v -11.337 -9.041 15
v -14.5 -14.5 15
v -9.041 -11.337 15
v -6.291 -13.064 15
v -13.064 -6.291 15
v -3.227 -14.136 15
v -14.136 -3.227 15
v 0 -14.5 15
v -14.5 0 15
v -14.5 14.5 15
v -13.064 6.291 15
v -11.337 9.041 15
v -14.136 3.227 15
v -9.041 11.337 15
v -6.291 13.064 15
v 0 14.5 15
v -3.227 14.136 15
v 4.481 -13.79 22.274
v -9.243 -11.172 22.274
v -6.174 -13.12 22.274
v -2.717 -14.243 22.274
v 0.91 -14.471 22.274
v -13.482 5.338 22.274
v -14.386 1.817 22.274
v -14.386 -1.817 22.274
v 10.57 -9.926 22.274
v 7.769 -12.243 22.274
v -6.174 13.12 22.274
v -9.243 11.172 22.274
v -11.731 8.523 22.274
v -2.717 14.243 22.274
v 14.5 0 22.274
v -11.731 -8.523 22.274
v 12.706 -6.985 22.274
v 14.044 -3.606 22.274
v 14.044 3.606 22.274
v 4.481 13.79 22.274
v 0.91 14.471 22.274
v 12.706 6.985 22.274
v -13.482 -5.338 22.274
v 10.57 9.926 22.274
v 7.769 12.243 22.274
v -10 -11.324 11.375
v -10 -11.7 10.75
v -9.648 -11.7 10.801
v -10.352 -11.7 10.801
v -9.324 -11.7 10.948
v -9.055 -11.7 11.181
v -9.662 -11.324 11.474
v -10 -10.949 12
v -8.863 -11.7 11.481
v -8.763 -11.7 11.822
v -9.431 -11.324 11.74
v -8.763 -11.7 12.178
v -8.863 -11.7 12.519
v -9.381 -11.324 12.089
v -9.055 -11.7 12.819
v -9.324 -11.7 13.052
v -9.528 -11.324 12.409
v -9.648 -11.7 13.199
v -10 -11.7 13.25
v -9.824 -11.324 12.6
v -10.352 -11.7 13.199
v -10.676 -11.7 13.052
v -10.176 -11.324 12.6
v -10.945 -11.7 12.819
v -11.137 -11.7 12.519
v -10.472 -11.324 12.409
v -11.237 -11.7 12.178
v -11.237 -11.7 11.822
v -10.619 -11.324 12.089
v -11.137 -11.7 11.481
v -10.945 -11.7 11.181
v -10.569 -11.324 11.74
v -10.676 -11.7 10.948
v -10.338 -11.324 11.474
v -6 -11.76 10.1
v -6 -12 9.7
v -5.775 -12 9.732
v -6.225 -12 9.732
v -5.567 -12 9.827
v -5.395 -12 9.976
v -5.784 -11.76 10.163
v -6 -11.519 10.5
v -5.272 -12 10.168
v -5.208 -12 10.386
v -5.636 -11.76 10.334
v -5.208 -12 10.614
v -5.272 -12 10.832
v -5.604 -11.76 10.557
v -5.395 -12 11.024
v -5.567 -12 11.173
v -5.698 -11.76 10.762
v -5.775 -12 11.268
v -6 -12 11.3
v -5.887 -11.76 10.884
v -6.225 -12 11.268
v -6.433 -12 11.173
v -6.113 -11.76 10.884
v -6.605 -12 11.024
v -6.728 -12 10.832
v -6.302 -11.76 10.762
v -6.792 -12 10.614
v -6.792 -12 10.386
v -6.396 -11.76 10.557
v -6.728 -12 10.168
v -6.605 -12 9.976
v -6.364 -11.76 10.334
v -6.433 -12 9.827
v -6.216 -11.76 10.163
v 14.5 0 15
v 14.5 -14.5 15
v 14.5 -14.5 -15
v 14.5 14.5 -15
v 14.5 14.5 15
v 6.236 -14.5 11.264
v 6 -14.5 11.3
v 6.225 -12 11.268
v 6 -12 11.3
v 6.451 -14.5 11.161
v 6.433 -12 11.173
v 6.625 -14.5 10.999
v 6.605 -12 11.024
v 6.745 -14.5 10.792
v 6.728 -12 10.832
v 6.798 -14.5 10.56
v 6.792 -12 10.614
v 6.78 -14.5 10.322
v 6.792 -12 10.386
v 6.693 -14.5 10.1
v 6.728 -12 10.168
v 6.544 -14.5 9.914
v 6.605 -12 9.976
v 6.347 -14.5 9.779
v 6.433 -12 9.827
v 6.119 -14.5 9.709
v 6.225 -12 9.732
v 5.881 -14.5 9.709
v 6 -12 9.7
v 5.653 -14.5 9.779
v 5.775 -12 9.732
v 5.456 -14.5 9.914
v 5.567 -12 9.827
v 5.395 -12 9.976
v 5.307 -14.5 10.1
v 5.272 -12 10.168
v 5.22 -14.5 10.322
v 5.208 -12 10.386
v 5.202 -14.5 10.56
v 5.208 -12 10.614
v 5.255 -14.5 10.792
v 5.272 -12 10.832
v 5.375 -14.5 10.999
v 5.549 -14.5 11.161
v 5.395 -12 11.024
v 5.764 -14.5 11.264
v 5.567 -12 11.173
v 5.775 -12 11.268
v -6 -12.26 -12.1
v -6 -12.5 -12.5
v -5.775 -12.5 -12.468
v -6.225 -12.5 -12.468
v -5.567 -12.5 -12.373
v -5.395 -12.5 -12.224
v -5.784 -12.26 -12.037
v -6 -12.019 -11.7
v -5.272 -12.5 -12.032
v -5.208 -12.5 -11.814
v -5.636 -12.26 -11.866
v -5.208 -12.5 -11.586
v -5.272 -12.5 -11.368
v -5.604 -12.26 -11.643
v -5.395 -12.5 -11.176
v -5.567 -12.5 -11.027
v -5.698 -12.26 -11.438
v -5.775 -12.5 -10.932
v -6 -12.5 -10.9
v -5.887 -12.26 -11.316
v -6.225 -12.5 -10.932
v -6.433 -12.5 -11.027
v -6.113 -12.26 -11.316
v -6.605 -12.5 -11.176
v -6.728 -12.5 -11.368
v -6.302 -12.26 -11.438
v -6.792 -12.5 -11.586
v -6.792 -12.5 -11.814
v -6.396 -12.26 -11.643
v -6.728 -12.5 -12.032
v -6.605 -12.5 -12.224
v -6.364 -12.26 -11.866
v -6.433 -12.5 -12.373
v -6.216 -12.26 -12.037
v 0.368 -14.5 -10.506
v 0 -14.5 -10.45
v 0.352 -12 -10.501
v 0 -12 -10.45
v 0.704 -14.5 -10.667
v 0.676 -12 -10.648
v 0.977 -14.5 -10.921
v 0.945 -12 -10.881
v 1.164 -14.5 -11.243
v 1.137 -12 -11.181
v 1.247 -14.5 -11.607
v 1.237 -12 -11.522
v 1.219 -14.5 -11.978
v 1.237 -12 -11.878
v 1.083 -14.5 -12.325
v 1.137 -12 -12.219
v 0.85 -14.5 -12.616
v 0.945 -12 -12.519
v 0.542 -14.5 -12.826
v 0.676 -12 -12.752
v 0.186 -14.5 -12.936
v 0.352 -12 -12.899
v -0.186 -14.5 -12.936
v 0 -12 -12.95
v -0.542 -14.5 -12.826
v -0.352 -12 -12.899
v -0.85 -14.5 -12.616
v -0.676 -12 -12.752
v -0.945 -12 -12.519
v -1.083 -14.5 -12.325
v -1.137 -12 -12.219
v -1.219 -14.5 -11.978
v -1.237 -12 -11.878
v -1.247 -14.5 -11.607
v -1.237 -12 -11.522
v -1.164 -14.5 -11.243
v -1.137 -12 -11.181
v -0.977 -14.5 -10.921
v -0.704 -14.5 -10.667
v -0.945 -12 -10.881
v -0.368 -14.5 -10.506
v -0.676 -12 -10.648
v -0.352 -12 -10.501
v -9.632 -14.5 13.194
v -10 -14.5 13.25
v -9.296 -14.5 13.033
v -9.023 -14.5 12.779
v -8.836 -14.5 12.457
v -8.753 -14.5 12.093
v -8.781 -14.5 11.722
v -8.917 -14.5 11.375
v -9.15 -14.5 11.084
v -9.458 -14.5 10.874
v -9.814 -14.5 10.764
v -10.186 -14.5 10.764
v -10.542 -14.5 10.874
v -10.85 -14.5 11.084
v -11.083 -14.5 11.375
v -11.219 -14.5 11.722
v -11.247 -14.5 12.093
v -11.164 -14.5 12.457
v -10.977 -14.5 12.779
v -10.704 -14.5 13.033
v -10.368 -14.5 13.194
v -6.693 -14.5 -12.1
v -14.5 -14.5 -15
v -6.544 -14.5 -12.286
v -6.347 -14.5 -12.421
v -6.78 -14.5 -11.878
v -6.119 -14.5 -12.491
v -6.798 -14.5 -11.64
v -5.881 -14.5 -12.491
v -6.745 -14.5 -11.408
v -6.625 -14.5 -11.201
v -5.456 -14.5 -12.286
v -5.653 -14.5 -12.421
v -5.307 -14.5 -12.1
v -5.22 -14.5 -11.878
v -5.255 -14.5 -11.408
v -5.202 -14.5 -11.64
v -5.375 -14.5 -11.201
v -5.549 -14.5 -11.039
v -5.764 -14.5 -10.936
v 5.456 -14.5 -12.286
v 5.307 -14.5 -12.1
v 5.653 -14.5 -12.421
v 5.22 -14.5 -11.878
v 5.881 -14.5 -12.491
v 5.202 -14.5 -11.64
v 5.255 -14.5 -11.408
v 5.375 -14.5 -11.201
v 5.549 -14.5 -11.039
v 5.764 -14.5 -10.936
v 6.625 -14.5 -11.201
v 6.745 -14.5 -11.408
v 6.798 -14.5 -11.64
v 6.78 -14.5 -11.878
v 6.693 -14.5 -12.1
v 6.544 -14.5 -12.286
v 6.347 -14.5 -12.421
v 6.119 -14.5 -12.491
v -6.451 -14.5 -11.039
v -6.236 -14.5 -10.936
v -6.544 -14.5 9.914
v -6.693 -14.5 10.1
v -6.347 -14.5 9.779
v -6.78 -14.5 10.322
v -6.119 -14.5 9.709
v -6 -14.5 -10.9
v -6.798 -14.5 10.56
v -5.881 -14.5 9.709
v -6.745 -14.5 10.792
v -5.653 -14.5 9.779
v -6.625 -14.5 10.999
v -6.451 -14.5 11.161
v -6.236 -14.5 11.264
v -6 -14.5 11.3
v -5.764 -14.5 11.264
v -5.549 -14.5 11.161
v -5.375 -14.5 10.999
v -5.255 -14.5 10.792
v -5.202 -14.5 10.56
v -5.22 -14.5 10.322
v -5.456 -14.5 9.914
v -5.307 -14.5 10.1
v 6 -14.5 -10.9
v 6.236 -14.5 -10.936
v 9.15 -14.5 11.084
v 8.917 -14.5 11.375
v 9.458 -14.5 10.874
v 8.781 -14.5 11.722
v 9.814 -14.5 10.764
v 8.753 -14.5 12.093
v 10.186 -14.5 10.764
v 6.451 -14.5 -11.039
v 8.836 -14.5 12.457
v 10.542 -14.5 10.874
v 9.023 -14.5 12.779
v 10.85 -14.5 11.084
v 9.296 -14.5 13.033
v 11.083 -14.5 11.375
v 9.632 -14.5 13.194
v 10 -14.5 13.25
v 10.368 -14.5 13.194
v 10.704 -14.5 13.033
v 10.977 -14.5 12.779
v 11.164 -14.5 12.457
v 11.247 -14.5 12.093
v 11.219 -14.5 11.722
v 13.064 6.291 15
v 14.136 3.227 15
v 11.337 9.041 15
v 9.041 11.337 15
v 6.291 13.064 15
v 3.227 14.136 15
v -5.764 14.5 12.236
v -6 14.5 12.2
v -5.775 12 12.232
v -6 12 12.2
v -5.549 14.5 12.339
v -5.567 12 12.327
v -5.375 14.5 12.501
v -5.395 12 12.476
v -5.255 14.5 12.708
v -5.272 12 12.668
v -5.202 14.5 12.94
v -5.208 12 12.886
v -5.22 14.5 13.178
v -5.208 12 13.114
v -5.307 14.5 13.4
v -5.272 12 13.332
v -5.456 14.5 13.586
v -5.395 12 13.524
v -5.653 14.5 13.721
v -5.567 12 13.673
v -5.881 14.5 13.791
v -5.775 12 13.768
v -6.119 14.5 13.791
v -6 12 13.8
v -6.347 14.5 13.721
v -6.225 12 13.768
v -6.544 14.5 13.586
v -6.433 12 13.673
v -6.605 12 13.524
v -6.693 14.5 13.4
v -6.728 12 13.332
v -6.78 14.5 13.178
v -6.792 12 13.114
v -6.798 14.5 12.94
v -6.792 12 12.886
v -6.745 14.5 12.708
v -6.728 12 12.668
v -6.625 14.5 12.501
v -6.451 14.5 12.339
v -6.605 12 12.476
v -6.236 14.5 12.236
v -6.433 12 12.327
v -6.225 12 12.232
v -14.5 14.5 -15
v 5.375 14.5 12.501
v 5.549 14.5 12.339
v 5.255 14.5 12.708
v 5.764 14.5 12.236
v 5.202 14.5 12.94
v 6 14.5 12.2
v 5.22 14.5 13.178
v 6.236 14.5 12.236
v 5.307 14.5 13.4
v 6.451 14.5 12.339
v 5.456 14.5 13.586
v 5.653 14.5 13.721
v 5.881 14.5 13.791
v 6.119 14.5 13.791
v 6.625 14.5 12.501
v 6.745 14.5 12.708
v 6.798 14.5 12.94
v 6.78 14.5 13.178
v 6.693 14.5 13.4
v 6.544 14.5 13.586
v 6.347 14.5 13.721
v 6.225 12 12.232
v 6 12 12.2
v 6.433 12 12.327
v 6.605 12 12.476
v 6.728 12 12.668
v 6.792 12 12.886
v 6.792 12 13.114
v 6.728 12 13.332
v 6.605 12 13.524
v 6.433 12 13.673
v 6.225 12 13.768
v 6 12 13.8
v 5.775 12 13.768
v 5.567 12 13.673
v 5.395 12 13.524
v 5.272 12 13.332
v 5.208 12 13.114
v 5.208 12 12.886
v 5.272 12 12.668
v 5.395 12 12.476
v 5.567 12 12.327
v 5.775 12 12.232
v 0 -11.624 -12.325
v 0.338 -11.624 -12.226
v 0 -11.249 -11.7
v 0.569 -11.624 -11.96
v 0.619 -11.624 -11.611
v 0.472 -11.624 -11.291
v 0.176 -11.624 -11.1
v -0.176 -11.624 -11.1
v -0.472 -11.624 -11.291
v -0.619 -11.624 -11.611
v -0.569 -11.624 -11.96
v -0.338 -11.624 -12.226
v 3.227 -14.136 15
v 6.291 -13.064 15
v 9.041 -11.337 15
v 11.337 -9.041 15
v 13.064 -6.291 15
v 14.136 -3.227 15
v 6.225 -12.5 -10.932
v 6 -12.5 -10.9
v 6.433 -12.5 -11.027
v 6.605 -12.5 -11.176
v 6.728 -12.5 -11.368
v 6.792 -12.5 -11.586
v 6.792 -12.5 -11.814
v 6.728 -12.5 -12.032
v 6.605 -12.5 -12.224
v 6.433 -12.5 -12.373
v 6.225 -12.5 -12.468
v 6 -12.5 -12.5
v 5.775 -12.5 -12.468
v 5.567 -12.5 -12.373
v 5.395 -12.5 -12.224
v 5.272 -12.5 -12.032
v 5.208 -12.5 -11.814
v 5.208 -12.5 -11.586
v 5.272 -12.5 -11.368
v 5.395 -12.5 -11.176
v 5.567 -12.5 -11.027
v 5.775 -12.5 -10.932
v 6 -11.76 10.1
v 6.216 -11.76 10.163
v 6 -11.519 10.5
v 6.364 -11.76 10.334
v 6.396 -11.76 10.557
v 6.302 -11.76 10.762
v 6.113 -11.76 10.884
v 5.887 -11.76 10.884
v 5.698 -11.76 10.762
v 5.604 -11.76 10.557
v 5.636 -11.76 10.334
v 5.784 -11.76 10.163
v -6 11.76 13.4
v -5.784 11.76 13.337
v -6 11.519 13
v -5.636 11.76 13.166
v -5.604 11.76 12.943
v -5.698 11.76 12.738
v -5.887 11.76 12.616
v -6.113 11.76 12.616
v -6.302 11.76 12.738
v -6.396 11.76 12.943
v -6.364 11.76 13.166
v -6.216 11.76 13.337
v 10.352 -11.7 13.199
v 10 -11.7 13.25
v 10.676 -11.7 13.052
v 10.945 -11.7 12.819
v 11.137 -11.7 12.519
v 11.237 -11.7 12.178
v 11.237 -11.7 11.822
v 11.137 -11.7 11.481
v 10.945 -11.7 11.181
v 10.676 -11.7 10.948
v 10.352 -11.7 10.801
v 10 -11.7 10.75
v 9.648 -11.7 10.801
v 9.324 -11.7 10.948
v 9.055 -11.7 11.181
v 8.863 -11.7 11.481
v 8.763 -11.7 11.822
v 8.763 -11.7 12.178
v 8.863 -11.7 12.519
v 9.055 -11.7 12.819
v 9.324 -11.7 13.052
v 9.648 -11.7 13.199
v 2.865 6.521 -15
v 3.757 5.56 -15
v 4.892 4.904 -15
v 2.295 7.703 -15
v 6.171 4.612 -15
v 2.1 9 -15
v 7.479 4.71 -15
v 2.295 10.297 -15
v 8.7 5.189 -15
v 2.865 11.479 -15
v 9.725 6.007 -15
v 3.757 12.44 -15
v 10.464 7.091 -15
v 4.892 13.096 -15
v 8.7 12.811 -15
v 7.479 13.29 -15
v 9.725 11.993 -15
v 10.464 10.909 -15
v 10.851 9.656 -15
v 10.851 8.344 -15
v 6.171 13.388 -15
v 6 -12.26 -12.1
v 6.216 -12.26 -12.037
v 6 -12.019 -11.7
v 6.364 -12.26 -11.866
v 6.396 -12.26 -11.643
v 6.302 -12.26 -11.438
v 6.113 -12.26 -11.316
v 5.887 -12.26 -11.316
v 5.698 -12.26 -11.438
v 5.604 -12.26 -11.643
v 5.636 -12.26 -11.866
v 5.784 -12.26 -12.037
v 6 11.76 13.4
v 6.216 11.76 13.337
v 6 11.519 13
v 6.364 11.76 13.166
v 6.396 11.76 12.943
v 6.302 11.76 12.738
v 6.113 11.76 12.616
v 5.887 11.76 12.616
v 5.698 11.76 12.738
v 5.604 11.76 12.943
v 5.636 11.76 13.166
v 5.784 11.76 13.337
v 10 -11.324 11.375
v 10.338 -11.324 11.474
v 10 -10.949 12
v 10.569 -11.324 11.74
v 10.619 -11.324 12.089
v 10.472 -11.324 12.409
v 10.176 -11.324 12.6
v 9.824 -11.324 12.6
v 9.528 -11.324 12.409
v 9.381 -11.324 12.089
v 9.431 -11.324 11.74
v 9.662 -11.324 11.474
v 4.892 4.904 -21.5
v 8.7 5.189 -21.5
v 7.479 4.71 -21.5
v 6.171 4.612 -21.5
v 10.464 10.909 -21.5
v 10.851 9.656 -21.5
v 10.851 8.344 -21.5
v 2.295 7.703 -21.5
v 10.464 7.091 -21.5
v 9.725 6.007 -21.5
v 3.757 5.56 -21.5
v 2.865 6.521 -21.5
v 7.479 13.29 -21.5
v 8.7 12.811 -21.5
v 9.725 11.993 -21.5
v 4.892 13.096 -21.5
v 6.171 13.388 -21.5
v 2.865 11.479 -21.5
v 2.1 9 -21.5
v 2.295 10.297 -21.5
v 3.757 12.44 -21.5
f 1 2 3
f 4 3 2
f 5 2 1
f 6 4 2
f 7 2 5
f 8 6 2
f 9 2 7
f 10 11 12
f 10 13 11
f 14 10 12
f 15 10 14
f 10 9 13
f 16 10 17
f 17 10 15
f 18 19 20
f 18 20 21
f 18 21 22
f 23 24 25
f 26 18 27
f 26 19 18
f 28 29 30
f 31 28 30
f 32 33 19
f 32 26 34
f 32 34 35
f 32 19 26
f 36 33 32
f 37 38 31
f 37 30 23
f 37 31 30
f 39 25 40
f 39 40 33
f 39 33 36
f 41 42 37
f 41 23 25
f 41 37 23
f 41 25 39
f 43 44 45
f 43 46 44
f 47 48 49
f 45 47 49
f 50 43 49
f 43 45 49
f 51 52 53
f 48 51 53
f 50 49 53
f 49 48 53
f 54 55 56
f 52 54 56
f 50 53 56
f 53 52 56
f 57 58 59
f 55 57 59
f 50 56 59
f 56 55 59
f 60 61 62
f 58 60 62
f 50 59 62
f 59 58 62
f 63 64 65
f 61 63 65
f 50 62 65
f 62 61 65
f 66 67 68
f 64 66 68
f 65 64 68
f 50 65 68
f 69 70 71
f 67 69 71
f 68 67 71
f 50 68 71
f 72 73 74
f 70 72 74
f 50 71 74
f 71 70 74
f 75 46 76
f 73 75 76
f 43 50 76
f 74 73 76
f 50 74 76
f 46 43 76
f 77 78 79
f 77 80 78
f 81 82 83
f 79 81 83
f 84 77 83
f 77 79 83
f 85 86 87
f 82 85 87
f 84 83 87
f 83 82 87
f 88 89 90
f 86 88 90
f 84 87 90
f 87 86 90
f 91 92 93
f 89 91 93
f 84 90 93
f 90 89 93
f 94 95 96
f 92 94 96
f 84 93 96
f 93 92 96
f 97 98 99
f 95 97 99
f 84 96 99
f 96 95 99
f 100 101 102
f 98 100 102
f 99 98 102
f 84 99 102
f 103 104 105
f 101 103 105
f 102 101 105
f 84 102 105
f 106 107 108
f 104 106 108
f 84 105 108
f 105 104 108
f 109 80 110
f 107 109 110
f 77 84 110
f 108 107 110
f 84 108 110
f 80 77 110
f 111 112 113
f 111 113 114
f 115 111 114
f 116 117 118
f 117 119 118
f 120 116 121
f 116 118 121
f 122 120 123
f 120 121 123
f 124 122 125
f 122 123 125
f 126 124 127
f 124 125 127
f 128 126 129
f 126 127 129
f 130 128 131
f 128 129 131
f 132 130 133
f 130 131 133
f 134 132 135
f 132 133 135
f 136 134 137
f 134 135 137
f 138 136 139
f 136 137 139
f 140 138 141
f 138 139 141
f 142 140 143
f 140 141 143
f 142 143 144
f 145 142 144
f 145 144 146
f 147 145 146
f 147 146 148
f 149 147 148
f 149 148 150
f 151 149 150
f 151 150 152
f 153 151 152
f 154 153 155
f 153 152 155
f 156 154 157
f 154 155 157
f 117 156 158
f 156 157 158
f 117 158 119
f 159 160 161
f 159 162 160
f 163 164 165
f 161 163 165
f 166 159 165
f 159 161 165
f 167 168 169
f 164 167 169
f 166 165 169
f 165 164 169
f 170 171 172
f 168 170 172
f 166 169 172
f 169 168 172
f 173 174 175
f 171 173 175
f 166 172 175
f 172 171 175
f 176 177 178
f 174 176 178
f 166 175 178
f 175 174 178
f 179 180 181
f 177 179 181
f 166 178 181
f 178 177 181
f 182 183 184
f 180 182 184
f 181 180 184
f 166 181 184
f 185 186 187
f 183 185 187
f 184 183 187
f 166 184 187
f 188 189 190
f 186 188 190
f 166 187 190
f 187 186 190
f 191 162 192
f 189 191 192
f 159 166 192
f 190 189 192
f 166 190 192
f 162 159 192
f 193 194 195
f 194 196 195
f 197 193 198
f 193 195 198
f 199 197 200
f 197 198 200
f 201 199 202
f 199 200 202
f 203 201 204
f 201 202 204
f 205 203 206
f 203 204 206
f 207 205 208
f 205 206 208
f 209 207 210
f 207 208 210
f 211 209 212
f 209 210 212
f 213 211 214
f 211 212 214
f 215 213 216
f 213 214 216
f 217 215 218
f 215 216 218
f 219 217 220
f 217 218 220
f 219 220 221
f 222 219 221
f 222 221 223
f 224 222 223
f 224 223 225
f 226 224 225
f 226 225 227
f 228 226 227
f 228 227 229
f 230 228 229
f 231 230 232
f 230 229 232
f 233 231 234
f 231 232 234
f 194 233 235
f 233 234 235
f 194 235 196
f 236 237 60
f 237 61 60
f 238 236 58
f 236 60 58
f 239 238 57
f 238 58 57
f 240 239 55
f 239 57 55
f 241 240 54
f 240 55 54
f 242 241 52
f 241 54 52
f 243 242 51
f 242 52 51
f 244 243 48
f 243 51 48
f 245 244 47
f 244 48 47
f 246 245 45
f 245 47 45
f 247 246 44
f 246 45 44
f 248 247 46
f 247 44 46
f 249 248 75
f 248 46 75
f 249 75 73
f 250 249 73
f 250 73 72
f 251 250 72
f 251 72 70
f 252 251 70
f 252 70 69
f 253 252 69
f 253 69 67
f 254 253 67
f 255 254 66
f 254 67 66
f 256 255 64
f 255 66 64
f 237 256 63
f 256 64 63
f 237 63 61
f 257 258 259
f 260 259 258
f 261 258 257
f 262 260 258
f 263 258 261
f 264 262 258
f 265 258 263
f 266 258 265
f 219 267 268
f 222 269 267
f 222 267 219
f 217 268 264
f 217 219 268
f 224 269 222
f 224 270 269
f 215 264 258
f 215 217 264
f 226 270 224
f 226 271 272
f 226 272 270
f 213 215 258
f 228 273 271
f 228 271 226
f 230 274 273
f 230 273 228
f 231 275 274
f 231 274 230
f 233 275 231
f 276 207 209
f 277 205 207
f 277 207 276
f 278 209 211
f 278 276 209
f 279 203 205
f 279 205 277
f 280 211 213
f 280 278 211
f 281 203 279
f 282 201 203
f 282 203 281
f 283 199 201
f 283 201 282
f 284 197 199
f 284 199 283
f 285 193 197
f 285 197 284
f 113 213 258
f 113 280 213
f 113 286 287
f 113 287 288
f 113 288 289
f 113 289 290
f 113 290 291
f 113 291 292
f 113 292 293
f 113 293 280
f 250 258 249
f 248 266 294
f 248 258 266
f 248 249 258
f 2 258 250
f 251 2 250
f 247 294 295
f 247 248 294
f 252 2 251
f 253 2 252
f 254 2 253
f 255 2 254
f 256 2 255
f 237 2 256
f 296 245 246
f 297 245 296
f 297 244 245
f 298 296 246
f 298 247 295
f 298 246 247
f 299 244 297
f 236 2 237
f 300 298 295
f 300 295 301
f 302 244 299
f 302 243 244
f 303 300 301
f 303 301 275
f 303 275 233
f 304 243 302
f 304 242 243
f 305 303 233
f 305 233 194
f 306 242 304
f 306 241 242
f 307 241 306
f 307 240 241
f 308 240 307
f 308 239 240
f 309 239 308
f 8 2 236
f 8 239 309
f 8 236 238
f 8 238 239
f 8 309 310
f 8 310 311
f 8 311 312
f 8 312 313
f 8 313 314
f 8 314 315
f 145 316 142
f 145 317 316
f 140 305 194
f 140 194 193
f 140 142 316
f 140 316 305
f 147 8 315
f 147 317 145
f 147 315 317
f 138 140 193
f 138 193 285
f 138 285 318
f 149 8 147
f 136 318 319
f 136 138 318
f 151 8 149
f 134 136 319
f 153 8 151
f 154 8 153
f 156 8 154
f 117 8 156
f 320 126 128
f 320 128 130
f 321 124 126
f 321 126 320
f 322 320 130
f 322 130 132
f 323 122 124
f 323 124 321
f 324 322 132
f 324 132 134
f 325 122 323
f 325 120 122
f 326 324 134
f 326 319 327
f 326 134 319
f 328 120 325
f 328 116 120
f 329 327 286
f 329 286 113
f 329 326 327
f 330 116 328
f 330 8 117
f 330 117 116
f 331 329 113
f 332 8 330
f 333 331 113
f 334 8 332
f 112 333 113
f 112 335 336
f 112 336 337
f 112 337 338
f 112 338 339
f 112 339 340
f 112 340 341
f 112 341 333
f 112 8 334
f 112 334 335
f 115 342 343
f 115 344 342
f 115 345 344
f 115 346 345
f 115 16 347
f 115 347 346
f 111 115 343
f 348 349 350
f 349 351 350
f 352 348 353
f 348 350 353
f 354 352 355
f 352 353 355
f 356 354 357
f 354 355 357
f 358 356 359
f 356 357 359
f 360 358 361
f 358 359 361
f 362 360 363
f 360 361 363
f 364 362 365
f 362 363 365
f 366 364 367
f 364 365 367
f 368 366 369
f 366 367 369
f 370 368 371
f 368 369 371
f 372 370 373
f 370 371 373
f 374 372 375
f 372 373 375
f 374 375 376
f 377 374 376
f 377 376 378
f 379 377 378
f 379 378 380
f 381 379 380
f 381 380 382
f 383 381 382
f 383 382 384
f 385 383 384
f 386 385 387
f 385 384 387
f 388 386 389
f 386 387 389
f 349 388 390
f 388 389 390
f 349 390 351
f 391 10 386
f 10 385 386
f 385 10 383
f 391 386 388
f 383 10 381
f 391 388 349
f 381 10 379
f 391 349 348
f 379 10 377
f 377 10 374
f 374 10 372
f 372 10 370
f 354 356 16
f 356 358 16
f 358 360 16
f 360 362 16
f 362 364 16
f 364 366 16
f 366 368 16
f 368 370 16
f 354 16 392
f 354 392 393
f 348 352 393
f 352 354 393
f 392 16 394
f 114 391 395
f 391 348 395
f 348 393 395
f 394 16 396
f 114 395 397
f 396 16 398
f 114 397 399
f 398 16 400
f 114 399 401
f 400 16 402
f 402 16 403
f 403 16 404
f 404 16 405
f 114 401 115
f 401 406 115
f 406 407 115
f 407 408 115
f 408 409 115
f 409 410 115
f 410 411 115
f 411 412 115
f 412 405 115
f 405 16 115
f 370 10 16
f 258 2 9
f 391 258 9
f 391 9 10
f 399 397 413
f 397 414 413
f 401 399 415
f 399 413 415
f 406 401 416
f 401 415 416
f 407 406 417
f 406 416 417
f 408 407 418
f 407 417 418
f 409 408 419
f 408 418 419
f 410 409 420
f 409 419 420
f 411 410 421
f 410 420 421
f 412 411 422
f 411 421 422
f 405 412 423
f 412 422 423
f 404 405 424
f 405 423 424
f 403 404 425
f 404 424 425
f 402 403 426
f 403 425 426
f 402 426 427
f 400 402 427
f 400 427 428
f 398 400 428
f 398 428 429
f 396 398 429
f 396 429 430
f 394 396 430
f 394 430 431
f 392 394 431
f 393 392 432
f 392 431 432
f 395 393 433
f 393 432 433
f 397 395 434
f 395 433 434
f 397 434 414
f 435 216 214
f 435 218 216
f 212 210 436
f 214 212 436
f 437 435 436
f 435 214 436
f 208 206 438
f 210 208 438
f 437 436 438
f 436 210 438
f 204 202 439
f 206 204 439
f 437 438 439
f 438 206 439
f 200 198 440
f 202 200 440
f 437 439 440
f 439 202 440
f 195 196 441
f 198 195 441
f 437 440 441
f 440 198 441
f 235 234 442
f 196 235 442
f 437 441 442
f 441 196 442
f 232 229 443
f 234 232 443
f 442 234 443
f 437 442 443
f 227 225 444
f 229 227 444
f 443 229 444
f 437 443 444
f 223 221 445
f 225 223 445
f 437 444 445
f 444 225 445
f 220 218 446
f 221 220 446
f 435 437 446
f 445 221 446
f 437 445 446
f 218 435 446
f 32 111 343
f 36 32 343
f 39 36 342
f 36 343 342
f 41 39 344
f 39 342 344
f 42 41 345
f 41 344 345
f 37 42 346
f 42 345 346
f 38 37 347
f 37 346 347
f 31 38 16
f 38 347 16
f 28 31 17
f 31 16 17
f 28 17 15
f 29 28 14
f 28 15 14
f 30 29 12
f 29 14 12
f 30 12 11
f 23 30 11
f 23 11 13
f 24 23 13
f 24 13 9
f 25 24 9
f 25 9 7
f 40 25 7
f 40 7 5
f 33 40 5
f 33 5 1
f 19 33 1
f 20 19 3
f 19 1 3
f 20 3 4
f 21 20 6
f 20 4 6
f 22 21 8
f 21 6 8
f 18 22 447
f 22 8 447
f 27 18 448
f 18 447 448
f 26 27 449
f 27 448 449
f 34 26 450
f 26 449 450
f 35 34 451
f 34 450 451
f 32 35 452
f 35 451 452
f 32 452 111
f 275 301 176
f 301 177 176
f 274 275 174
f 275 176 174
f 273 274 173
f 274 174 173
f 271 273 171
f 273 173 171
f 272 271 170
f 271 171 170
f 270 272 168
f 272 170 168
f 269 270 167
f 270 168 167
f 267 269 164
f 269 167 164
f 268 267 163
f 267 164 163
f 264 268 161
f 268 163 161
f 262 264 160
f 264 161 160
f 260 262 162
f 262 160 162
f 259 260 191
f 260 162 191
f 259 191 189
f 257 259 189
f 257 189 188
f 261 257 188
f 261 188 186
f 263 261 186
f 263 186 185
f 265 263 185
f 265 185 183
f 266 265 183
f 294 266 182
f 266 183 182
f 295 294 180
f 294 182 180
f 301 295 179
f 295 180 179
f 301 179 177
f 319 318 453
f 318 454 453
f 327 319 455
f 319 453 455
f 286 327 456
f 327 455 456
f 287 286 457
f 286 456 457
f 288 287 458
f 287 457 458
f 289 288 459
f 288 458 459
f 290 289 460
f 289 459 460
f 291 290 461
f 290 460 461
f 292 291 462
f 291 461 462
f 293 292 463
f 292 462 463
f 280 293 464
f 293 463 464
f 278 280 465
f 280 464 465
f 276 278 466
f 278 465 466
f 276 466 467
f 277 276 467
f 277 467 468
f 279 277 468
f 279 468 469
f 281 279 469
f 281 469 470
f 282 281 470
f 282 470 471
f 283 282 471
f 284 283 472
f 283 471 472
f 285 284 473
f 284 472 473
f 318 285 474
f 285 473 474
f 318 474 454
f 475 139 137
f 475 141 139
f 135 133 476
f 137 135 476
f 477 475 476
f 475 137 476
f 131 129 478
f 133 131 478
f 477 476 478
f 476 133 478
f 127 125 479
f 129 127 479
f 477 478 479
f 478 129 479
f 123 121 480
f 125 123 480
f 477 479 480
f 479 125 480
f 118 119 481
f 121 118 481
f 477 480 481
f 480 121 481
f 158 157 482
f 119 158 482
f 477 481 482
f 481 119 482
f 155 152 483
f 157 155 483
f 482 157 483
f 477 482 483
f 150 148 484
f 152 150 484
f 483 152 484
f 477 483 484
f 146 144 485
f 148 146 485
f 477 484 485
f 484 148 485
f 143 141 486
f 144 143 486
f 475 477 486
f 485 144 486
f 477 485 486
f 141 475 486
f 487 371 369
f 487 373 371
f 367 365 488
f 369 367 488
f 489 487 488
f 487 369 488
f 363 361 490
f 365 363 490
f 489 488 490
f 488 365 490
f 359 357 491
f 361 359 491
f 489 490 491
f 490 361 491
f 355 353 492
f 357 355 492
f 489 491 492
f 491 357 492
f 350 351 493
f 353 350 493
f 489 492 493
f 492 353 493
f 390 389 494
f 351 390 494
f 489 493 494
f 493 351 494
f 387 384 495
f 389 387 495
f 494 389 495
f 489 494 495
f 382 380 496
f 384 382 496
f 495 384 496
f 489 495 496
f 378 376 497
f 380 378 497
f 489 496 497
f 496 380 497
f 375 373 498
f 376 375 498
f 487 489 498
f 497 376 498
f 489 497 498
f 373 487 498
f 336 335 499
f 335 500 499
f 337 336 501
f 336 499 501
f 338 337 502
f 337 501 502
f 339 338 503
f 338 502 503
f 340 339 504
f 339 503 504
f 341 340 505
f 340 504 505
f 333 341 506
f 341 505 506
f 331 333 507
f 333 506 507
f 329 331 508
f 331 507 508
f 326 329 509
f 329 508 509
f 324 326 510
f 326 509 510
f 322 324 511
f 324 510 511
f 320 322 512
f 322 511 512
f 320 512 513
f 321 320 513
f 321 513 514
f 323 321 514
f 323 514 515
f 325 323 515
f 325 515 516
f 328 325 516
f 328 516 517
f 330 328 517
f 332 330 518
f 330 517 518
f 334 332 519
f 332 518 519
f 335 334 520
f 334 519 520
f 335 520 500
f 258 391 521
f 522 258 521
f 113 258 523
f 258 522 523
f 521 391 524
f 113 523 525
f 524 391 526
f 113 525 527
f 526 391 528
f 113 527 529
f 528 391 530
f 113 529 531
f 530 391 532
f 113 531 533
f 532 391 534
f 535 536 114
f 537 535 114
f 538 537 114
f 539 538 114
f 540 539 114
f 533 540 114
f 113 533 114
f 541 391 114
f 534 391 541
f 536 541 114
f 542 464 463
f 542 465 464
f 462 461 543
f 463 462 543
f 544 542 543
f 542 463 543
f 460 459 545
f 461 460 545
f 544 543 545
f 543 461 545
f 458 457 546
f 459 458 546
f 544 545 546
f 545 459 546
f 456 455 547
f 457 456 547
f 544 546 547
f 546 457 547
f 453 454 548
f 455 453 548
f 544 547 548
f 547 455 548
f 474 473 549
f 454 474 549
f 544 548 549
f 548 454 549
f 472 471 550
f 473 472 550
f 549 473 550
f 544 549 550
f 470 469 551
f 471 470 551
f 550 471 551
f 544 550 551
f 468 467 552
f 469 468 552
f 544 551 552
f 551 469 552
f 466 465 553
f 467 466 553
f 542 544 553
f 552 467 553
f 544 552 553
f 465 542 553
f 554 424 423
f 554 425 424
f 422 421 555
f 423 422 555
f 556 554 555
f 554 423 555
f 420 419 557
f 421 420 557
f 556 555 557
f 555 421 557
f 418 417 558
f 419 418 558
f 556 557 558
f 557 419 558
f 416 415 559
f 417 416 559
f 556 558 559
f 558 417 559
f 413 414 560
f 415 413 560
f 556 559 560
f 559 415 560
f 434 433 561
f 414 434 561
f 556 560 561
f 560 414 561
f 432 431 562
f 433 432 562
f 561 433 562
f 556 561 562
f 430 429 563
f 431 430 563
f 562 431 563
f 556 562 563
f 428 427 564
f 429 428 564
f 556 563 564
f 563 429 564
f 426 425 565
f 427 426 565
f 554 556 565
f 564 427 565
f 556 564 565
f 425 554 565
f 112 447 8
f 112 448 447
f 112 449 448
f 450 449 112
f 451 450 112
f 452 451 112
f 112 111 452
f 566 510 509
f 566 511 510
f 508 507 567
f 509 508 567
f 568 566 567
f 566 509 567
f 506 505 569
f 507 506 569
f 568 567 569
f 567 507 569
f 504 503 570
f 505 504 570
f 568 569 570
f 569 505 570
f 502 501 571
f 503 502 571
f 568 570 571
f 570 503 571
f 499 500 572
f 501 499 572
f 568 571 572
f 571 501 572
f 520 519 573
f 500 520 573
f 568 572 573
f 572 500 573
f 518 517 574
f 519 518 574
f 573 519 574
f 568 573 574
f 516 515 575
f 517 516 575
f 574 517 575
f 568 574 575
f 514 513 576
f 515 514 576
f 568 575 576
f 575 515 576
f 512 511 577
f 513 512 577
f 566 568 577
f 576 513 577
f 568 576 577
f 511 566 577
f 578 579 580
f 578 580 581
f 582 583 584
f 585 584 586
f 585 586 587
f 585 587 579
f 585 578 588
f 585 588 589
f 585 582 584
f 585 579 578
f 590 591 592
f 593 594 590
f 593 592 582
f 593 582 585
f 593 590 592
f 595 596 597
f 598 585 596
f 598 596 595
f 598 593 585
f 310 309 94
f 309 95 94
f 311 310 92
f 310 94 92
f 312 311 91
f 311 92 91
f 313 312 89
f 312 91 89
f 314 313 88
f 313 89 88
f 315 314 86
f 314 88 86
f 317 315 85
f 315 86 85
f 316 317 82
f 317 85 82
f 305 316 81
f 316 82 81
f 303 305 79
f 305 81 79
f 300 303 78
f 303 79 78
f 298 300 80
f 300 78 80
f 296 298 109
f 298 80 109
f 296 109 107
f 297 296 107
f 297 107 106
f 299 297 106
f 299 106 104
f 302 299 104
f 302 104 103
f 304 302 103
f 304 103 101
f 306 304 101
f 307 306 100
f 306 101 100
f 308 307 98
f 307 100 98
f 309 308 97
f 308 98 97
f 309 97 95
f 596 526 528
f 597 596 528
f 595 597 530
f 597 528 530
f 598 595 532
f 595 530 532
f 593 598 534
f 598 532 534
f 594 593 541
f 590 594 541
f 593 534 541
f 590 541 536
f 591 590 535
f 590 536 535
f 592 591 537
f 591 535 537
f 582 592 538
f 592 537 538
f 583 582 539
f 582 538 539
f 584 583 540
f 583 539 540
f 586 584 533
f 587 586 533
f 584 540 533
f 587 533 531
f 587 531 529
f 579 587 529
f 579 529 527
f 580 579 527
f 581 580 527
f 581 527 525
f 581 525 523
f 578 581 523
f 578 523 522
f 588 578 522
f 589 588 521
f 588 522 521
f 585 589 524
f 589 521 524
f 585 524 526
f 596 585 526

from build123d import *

# Parameters (mm, degrees)
SKETCH1_W                 = 29
SKETCH1_H                 = 29
BOSS_EXTRUDE1_DEPTH       = 15
SKETCH2_R                 = 14.5
BOSS_EXTRUDE2_DEPTH       = 7.274
M2X0_4_TAPPED_HOLE1_D     = 1.6
M2X0_4_TAPPED_HOLE1_DEPTH = 2.5
M2X0_4_TAPPED_HOLE1_TIP   = 0.480688495
M2X0_4_TAPPED_HOLE2_D     = 1.6
M2X0_4_TAPPED_HOLE2_DEPTH = 2
M2X0_4_TAPPED_HOLE2_TIP   = 0.480688495
M2X0_4_TAPPED_HOLE3_D     = 1.6
M2X0_4_TAPPED_HOLE3_DEPTH = 2.5
M2X0_4_TAPPED_HOLE3_TIP   = 0.480688495
M3X0_5_TAPPED_HOLE2_D     = 2.5
M3X0_5_TAPPED_HOLE2_DEPTH = 2.8
M3X0_5_TAPPED_HOLE2_TIP   = 0.751075774
M3X0_5_TAPPED_HOLE1_D     = 2.5
M3X0_5_TAPPED_HOLE1_DEPTH = 2.5
M3X0_5_TAPPED_HOLE1_TIP   = 0.751075774
SKETCH10_R                = 4.4
BOSS_EXTRUDE3_DEPTH       = 6.5


with BuildPart() as part:
    # Sketch1 → Boss-Extrude1 (new body, symmetric)
    with BuildSketch(Plane.XY):
        Rectangle(SKETCH1_W, SKETCH1_H)
    extrude(amount=BOSS_EXTRUDE1_DEPTH, both=True)

    # Sketch2 → Boss-Extrude2 (add)
    with BuildSketch(Plane.XY.offset(15)):
        Circle(SKETCH2_R)
    extrude(amount=BOSS_EXTRUDE2_DEPTH)

    # M2x0.4 Tapped Hole1
    with Locations(Plane(origin=(-6, 14.5, 13), x_dir=(0, 0, 1), z_dir=(0, 1, 0))):
        with Locations((0, 0), (0, 12)):
            Hole(M2X0_4_TAPPED_HOLE1_D / 2, depth=M2X0_4_TAPPED_HOLE1_DEPTH)
            with Locations((0, 0, -(M2X0_4_TAPPED_HOLE1_DEPTH + M2X0_4_TAPPED_HOLE1_TIP / 2))):  # 118° drill point
                Cone(0, M2X0_4_TAPPED_HOLE1_D / 2, M2X0_4_TAPPED_HOLE1_TIP, mode=Mode.SUBTRACT)

    # M2x0.4 Tapped Hole2
    with Locations(Plane(origin=(-6, -14.5, -11.7), x_dir=(0, 0, -1), z_dir=(0, -1, 0))):
        with Locations((0, 0), (0, 12)):
            Hole(M2X0_4_TAPPED_HOLE2_D / 2, depth=M2X0_4_TAPPED_HOLE2_DEPTH)
            with Locations((0, 0, -(M2X0_4_TAPPED_HOLE2_DEPTH + M2X0_4_TAPPED_HOLE2_TIP / 2))):  # 118° drill point
                Cone(0, M2X0_4_TAPPED_HOLE2_D / 2, M2X0_4_TAPPED_HOLE2_TIP, mode=Mode.SUBTRACT)

    # M2x0.4 Tapped Hole3
    with Locations(Plane(origin=(-6, -14.5, 10.5), x_dir=(0, 0, -1), z_dir=(0, -1, 0))):
        with Locations((0, 0), (0, 12)):
            Hole(M2X0_4_TAPPED_HOLE3_D / 2, depth=M2X0_4_TAPPED_HOLE3_DEPTH)
            with Locations((0, 0, -(M2X0_4_TAPPED_HOLE3_DEPTH + M2X0_4_TAPPED_HOLE3_TIP / 2))):  # 118° drill point
                Cone(0, M2X0_4_TAPPED_HOLE3_D / 2, M2X0_4_TAPPED_HOLE3_TIP, mode=Mode.SUBTRACT)

    # M3x0.5 Tapped Hole2
    with Locations(Plane(origin=(10, -14.5, 12), x_dir=(0, 0, -1), z_dir=(0, -1, 0))):
        with Locations((0, 0), (0, -20)):
            Hole(M3X0_5_TAPPED_HOLE2_D / 2, depth=M3X0_5_TAPPED_HOLE2_DEPTH)
            with Locations((0, 0, -(M3X0_5_TAPPED_HOLE2_DEPTH + M3X0_5_TAPPED_HOLE2_TIP / 2))):  # 118° drill point
                Cone(0, M3X0_5_TAPPED_HOLE2_D / 2, M3X0_5_TAPPED_HOLE2_TIP, mode=Mode.SUBTRACT)

    # M3x0.5 Tapped Hole1
    with Locations(Plane(origin=(0, -14.5, -11.7), x_dir=(0, 0, -1), z_dir=(0, -1, 0))):
        with Locations((0, 0)):
            Hole(M3X0_5_TAPPED_HOLE1_D / 2, depth=M3X0_5_TAPPED_HOLE1_DEPTH)
            with Locations((0, 0, -(M3X0_5_TAPPED_HOLE1_DEPTH + M3X0_5_TAPPED_HOLE1_TIP / 2))):  # 118° drill point
                Cone(0, M3X0_5_TAPPED_HOLE1_D / 2, M3X0_5_TAPPED_HOLE1_TIP, mode=Mode.SUBTRACT)

    # Sketch10 → Boss-Extrude3 (add)
    with BuildSketch(Plane(origin=(0, 0, -15), x_dir=(-1, 0, 0), z_dir=(0, 0, -1))):
        with Locations((-6.5, 9)):
            Circle(SKETCH10_R)
    extrude(amount=BOSS_EXTRUDE3_DEPTH)


solid = part.part
